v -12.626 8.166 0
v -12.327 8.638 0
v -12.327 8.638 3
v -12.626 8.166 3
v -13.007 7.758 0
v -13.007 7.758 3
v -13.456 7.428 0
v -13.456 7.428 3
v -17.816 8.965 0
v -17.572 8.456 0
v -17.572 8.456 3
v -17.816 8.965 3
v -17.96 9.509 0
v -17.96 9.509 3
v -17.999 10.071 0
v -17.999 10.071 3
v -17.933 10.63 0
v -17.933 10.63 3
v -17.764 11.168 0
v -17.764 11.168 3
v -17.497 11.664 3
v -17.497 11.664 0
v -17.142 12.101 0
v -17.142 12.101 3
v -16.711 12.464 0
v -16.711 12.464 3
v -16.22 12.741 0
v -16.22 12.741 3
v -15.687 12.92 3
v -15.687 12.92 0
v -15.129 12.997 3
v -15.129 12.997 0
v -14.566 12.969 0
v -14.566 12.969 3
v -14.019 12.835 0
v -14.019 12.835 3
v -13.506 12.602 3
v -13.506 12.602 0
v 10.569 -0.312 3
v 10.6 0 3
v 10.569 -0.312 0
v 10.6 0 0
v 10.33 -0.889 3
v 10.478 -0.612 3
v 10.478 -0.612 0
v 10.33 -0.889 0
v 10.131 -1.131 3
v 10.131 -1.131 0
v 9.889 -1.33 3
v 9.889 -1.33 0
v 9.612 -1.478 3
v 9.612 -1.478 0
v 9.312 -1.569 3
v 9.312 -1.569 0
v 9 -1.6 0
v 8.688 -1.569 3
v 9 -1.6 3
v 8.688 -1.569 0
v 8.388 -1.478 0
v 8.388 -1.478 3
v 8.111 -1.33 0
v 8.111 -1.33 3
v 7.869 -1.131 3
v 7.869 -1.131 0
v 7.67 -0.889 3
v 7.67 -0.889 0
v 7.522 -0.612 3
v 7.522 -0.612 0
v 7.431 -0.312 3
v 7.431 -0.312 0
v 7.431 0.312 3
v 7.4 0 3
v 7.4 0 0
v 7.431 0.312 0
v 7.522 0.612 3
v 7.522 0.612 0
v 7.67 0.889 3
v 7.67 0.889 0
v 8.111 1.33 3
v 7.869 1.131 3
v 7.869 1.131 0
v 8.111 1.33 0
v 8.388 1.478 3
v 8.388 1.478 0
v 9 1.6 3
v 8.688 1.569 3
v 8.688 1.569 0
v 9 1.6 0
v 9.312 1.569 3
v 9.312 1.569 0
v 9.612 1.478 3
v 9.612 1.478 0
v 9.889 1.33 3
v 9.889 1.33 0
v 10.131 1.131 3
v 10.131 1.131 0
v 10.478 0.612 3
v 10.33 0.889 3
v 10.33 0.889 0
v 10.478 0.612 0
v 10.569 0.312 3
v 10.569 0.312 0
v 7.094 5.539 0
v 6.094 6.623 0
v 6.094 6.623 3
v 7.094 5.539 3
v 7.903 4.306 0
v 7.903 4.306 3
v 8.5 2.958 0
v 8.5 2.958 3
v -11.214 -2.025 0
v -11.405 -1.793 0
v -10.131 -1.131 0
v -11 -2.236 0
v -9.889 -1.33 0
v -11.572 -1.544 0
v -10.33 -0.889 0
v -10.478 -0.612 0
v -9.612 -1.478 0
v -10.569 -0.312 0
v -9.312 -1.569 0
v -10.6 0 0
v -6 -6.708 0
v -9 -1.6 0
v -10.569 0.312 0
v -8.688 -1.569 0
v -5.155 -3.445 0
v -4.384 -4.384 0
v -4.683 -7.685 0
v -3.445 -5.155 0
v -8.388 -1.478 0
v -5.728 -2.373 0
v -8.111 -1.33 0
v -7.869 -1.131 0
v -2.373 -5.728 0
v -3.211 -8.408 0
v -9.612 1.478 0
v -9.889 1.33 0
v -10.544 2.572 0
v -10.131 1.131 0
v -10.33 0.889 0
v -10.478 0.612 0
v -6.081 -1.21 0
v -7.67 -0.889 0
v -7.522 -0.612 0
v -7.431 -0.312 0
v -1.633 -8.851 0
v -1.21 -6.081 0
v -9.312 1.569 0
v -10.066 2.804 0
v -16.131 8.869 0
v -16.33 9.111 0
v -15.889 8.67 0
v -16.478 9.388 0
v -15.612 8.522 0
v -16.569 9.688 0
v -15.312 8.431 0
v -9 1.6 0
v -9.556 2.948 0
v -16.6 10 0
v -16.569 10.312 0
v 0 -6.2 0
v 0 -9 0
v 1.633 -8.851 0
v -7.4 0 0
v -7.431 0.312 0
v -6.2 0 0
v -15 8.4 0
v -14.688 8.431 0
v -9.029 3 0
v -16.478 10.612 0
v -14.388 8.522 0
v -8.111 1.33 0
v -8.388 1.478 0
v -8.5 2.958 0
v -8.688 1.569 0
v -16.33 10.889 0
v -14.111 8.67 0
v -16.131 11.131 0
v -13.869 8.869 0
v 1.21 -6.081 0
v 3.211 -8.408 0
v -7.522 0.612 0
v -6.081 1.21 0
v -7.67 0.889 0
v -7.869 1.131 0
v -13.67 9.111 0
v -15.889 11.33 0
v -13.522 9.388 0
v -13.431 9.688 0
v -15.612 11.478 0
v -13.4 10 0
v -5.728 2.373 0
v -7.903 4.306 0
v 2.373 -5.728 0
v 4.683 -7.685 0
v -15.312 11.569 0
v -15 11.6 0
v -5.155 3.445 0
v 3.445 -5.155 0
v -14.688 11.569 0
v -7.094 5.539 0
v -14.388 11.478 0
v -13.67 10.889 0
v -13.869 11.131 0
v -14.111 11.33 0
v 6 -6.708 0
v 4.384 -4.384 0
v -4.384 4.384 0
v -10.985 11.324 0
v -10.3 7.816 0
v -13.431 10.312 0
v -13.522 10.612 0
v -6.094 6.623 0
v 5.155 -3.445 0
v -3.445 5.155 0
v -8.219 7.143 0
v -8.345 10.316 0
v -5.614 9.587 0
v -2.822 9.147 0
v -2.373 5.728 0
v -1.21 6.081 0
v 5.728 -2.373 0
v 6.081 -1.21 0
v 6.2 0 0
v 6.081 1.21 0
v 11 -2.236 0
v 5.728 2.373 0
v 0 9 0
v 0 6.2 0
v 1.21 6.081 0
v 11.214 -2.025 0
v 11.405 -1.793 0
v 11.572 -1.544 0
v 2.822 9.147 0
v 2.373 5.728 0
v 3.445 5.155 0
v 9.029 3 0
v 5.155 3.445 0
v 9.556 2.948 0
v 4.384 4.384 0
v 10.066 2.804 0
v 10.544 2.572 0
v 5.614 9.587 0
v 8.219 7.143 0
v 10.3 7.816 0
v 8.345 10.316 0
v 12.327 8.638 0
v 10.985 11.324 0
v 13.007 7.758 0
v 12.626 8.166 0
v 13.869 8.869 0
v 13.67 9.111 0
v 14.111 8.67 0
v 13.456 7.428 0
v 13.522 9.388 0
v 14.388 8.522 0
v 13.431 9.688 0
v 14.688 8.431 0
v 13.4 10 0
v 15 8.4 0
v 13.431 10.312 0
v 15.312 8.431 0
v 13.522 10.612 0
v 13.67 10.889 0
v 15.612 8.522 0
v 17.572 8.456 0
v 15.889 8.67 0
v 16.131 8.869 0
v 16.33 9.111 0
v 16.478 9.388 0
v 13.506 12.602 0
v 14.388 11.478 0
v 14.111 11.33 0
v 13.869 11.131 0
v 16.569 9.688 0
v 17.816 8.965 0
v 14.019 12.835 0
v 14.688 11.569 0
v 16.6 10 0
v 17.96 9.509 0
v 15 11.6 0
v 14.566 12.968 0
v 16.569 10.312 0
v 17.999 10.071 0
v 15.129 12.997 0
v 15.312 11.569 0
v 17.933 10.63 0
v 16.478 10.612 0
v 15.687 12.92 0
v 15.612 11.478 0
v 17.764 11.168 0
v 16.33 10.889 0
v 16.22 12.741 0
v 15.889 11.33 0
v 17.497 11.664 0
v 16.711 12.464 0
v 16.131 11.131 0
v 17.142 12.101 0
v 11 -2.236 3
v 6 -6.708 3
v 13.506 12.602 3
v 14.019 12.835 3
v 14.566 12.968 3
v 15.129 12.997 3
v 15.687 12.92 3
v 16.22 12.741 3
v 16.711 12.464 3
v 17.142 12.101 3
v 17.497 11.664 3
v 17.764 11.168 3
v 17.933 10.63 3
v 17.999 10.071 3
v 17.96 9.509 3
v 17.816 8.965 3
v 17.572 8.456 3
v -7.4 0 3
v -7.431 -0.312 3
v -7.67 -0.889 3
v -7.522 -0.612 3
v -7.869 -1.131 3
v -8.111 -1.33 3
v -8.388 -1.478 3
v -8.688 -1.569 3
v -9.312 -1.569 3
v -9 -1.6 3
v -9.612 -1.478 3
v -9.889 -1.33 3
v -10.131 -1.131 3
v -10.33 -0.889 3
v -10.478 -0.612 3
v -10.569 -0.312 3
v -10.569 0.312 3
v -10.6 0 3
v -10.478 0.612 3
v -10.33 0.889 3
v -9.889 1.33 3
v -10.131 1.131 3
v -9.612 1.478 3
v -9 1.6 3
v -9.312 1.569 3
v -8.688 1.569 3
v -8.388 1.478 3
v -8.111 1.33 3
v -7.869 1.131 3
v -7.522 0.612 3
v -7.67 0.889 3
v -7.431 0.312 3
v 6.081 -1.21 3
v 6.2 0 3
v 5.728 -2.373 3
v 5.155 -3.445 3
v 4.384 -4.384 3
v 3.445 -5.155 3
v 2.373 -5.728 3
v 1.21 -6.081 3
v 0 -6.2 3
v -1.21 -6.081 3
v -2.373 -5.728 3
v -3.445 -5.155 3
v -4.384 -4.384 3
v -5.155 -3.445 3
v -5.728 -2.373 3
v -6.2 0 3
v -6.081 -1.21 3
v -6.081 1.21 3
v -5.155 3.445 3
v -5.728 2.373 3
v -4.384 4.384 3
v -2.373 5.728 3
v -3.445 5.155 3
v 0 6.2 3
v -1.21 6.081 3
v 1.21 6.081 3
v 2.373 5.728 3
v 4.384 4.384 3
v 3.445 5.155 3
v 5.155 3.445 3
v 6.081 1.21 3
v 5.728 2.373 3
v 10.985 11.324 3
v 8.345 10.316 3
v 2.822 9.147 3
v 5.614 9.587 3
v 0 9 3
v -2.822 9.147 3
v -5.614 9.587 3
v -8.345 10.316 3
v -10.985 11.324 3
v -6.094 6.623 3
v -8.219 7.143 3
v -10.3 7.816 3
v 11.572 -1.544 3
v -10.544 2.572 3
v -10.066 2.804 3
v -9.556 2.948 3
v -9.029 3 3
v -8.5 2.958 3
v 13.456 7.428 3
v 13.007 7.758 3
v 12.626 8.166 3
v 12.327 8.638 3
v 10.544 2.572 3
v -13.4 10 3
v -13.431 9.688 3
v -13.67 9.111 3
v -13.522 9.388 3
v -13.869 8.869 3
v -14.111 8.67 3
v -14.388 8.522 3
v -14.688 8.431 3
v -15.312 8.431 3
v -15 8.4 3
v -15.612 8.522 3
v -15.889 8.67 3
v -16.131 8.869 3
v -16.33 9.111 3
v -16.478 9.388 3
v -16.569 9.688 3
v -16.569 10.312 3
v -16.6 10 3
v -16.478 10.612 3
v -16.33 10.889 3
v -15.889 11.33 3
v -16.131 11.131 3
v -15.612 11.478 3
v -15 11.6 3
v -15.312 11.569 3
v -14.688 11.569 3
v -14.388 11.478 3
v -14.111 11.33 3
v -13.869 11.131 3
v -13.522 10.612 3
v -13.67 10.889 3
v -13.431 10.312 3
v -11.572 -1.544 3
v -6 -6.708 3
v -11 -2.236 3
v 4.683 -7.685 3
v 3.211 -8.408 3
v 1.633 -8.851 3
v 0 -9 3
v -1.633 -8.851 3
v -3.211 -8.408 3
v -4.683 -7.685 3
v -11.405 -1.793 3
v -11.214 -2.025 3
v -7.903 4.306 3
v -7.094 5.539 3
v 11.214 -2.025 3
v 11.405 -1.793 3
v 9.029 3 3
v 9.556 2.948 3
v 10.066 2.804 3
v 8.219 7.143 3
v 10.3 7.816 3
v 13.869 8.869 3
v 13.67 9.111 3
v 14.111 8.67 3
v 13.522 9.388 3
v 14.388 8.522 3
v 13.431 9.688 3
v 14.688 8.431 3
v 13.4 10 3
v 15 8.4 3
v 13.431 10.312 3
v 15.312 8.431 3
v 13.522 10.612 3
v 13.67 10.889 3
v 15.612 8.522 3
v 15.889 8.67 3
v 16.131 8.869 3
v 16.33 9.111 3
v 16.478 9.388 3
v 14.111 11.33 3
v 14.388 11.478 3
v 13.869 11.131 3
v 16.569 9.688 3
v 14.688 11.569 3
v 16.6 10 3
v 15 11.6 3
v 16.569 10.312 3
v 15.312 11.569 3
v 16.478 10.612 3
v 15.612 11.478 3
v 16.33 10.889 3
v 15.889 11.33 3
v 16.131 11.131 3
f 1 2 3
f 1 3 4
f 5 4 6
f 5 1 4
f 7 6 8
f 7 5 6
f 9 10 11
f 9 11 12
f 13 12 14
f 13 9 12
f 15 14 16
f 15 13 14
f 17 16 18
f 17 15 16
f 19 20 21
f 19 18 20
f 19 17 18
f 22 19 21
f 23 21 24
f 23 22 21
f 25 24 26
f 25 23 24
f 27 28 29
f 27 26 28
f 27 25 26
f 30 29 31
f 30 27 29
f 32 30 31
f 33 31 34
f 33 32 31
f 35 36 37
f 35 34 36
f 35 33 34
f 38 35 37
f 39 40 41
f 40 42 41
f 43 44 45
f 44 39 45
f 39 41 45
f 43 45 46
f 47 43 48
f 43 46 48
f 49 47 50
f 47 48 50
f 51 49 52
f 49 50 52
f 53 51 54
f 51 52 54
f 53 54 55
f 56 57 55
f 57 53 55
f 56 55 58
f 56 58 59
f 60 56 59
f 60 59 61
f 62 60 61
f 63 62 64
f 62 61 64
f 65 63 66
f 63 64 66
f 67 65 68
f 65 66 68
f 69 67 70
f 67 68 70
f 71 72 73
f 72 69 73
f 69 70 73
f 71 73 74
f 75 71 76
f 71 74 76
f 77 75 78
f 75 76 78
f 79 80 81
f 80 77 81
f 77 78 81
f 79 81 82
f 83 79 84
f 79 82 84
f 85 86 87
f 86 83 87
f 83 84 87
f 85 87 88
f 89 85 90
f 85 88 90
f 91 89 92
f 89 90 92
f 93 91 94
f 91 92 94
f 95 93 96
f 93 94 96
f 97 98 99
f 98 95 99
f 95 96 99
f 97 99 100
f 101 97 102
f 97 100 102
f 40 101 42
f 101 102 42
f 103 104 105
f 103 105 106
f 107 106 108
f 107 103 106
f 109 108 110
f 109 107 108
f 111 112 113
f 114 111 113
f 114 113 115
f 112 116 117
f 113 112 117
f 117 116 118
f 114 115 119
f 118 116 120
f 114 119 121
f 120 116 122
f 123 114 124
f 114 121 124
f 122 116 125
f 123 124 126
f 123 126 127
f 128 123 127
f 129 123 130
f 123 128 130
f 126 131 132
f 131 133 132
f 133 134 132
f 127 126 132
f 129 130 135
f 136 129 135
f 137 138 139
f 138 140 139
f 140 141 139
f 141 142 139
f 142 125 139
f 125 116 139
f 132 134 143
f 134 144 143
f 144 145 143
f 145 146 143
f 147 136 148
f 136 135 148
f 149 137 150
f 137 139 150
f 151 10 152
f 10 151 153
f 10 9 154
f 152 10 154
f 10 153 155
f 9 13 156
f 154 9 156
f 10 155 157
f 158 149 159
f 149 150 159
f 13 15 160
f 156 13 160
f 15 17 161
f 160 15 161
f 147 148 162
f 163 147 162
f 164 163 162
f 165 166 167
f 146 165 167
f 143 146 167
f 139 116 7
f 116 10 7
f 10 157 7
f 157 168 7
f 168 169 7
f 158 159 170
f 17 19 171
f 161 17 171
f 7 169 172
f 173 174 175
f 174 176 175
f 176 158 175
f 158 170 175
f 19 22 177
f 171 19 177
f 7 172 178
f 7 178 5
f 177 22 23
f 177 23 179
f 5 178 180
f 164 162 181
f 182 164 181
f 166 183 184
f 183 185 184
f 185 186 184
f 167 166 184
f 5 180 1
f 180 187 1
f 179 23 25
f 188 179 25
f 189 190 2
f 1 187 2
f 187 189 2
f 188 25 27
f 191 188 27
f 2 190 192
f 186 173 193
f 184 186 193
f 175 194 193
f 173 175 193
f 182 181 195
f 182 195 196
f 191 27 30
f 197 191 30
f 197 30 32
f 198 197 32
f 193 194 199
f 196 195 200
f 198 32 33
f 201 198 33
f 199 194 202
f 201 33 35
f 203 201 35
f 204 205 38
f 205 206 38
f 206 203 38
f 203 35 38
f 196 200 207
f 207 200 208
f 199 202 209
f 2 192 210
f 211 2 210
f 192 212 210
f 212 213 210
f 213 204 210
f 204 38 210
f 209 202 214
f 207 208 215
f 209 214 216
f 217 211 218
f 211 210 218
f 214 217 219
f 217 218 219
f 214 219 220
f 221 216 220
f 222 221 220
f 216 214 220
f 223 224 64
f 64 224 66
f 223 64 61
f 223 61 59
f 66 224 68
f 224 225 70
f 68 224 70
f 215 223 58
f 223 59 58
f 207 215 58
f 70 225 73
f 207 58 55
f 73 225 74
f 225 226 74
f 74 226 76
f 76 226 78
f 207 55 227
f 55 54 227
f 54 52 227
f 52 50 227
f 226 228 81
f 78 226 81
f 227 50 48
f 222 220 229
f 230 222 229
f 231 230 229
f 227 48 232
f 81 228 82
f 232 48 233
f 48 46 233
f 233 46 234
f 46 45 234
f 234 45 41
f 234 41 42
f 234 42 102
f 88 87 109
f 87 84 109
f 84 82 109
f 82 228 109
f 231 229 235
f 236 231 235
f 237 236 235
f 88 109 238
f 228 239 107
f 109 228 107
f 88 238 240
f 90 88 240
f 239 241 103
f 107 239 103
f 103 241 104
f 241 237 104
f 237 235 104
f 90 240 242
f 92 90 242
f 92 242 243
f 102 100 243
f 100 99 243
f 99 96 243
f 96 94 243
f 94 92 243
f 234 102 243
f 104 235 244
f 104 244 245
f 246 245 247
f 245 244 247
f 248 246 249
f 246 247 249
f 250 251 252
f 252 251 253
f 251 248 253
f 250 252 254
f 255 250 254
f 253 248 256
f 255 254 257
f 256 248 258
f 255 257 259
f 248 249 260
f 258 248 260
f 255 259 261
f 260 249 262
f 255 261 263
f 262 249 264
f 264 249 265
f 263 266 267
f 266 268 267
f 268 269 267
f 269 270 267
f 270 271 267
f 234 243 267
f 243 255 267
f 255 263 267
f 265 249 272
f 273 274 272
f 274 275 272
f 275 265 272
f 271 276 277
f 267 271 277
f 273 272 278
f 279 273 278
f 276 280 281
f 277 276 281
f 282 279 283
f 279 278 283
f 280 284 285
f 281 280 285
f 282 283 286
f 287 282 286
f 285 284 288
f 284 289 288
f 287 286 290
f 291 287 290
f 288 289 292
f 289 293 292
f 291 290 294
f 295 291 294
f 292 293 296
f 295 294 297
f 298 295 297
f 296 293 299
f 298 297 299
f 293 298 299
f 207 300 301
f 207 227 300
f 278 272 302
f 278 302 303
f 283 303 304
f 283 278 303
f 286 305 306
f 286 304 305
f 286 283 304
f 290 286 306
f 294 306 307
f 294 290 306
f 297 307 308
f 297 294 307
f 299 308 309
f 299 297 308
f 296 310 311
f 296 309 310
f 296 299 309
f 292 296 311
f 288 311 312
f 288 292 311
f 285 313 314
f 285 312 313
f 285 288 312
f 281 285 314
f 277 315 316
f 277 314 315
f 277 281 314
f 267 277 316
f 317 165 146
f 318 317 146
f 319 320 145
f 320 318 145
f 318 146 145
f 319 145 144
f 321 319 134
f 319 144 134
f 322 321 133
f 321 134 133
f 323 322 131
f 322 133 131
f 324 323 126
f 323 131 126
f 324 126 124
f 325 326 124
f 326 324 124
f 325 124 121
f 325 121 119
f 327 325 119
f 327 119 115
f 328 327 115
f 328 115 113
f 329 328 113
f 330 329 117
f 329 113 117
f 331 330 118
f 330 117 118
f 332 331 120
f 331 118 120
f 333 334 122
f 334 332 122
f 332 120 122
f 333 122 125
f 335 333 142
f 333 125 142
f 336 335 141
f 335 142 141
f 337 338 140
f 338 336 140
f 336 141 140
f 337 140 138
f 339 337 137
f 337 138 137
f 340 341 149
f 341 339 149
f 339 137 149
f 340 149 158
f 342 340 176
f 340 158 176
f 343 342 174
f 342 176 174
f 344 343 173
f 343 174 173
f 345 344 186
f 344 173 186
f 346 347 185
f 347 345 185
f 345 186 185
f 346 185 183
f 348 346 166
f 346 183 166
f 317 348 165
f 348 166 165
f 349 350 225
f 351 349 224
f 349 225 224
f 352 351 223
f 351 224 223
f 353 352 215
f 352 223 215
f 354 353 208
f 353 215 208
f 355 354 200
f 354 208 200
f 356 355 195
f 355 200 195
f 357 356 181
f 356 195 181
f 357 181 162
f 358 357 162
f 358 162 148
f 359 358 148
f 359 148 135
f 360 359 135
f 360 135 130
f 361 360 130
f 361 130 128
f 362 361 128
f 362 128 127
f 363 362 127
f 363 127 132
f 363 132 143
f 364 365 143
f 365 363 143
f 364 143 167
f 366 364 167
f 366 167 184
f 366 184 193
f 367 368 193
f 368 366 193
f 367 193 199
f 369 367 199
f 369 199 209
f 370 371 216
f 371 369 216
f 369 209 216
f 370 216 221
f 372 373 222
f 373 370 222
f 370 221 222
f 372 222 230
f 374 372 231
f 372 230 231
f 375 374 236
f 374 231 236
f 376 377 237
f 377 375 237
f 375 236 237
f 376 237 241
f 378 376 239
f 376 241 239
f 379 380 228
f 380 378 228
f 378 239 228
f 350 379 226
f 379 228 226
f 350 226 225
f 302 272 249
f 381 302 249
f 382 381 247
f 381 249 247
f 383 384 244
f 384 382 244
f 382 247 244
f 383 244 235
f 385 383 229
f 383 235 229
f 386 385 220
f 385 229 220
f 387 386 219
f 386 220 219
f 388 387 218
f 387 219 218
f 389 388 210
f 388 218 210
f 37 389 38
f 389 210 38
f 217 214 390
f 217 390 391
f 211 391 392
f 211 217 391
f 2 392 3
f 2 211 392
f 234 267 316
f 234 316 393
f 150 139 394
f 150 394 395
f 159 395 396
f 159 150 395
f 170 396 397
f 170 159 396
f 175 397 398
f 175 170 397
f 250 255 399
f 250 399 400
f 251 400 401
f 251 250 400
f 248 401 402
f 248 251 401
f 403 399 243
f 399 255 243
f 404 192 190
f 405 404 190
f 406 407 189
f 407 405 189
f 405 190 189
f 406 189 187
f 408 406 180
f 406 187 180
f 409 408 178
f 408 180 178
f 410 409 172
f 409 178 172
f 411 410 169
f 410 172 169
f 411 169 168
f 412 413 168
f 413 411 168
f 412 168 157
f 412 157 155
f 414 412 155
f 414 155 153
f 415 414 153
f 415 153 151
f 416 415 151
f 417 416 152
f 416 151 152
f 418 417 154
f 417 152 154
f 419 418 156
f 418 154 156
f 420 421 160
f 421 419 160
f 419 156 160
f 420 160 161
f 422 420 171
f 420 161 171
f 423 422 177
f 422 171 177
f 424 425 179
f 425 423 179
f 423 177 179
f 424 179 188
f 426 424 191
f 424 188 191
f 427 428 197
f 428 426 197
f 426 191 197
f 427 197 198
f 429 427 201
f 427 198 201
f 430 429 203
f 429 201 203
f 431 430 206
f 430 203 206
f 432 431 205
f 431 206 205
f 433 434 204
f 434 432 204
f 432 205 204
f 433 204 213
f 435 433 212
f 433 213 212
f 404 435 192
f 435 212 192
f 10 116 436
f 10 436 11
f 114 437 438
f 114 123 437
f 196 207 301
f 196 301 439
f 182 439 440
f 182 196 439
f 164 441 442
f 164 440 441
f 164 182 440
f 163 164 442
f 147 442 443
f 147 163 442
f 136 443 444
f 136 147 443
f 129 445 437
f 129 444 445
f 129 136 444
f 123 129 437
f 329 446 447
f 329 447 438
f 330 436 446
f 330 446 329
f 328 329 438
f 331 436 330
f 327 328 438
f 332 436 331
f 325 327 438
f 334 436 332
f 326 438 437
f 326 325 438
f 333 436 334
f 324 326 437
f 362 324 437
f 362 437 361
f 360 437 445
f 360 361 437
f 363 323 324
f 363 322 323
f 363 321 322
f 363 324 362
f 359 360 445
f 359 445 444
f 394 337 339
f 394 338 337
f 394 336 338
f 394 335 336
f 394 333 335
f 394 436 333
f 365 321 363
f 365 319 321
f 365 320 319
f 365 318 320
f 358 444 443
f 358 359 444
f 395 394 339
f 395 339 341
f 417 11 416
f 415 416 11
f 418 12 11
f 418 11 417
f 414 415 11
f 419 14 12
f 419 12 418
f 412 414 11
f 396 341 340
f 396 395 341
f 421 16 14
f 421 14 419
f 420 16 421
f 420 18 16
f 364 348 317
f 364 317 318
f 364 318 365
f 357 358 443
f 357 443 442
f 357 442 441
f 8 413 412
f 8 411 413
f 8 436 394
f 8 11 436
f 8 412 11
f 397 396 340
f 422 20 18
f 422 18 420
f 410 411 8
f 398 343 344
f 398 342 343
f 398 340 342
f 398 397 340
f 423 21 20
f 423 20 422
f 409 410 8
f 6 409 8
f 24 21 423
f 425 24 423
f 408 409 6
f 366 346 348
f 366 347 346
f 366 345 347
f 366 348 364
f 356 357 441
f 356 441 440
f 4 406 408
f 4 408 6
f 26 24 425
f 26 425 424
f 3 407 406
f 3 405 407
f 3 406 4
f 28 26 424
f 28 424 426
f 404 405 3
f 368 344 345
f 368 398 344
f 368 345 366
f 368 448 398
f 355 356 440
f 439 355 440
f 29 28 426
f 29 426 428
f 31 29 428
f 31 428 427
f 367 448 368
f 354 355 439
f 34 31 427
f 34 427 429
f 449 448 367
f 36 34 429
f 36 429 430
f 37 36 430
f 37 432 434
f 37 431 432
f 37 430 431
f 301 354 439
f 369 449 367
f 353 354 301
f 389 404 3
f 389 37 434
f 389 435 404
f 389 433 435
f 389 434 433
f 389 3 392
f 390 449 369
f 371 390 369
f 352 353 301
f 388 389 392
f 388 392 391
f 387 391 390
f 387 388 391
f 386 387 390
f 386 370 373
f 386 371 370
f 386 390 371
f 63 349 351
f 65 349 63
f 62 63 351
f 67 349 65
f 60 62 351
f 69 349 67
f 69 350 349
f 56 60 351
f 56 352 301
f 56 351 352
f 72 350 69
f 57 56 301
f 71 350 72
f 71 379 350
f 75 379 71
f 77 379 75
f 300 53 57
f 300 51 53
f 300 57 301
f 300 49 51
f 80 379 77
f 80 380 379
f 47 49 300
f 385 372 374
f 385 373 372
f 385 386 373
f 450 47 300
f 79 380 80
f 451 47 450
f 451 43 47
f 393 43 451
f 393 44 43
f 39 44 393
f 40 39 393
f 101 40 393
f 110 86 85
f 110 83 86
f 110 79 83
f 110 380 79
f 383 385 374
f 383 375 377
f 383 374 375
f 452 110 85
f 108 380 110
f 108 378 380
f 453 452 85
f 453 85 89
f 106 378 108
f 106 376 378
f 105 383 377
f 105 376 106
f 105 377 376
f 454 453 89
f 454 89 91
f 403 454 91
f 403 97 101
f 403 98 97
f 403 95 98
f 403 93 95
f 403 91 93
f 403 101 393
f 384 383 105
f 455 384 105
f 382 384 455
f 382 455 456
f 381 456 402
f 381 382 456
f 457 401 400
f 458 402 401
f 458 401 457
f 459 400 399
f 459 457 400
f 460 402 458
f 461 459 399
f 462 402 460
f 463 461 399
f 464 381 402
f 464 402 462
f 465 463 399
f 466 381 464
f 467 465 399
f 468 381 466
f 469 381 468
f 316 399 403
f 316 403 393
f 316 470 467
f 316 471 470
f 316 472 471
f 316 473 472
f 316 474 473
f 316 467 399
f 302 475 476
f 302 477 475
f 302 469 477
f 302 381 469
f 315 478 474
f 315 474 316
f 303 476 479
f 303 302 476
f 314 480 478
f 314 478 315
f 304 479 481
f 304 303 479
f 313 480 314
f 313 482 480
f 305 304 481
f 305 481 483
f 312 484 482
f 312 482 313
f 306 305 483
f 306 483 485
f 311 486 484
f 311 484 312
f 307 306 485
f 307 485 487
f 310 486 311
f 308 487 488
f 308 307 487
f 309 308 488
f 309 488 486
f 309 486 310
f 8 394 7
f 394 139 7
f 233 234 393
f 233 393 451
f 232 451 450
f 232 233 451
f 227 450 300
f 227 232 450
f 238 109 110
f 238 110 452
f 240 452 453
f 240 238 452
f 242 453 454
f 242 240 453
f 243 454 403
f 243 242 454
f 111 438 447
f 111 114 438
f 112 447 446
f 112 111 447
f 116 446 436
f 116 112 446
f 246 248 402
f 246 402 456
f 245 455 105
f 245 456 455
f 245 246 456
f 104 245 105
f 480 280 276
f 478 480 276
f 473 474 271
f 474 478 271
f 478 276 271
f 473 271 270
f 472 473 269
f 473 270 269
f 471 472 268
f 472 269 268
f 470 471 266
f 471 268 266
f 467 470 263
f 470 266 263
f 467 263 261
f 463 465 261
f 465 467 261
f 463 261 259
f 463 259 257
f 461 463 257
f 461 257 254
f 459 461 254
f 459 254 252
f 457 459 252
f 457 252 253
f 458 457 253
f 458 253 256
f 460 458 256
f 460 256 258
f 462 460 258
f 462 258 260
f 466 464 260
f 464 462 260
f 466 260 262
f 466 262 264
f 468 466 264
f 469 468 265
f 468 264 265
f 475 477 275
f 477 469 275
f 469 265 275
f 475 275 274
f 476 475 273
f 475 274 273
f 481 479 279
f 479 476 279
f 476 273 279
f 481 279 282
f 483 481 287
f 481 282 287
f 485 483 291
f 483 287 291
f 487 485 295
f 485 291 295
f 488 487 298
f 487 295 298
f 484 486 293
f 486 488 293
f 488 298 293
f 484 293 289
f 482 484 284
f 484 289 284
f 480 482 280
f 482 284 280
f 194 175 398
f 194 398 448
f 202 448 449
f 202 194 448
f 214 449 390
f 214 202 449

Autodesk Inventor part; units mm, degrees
ref_plane "YZ Plane" through (0, 0, 0) normal (1, 0, 0) x (0, 1, 0)
ref_plane "XZ Plane" through (0, 0, 0) normal (0, 1, 0) x (-1, 0, 0)
ref_plane "XY Plane" through (0, 0, 0) normal (0, 0, 1) x (1, 0, 0)
sketch "スケッチ1" plane through (0, 0, 0) normal (0, 0, 1) x (1, 0, 0)
  circle A0 centre (0, 0) radius 6.2
  line L0 (-9, 0) -> (9, 0) construction
  circle A1 centre (9, 0) radius 1.6
  circle A2 centre (-9, 0) radius 1.6
  line L1 (15, 10) -> (-15, 10) construction
  circle A3 centre (15, 10) radius 1.6
  circle A4 centre (-15, 10) radius 1.6
  arc A5 (-6.1356, 0.8916) -> (-6.1356, -0.8916) centre (-9, 0) ccw
  arc A6 (6.1356, -0.8916) -> (6.1356, 0.8916) centre (9, 0) ccw
  line L2 (17.5725, 8.4565) -> (11.5725, -1.5435)
  line L3 (11, -2.2361) -> (6, -6.7082)
  line L4 (-6, -6.7082) -> (-11, -2.2361)
  line L5 (-11.5725, -1.5435) -> (-17.5725, 8.4565)
  arc A7 (-13.5062, 12.6017) -> (13.5062, 12.6017) centre (0, 36.125) ccw
  arc A8 (-8.5, -2.958) -> (8.5, -2.958) centre (0, 0) ccw
  arc A9 (-12.3272, 8.6376) -> (-6.0941, 6.6228) centre (0, 36.125) ccw
  arc A10 (6.0941, 6.6228) -> (12.3272, 8.6376) centre (0, 36.125) ccw
  line L6 (-10.5435, 2.5725) -> (-13.4565, 7.4275)
  line L7 (13.4565, 7.4275) -> (10.5435, 2.5725)
  arc A11 (8.5, 2.958) -> (6.0941, 6.6228) centre (0, 0) ccw
  arc A12 (-6.0941, 6.6228) -> (-8.5, 2.958) centre (0, 0) ccw
  arc A13 (-13.5062, 12.6017) -> (-17.5725, 8.4565) centre (-15, 10) ccw
  arc A14 (-13.4565, 7.4275) -> (-12.3272, 8.6376) centre (-15, 10) ccw
  arc A15 (17.5725, 8.4565) -> (13.5062, 12.6017) centre (15, 10) ccw
  arc A16 (12.3272, 8.6376) -> (13.4565, 7.4275) centre (15, 10) ccw
  point P0 (0, 10)
  dimension "d0" = 12.4
  dimension "d1" = 18
  dimension "d2" = 3.2
  dimension "d3" = 3.2
  dimension "d4" = 3.2
  dimension "d5" = 3.2
  dimension "d6" = 10
  dimension "d7" = 30
  dimension "d10" = 6
  dimension "d11" = 6
  dimension "d13" = 9
  dimension "d15" = 3
  dimension "d18" = 3
  dimension "d20" = 3
  dimension "d21" = 3
extrude "押し出し1" add sketch "スケッチ1" along normal blind 3 contours A0 A6 | A0 A5 A12 A9 A14 L6 L5 A13 A7 A15 L2 A6 L7 A16 A10 A11 | A6 A8 A5 A0 | A0 A5 | A6 L3 A8 | A8 L4 A5
properties part number "EncoderMount"
